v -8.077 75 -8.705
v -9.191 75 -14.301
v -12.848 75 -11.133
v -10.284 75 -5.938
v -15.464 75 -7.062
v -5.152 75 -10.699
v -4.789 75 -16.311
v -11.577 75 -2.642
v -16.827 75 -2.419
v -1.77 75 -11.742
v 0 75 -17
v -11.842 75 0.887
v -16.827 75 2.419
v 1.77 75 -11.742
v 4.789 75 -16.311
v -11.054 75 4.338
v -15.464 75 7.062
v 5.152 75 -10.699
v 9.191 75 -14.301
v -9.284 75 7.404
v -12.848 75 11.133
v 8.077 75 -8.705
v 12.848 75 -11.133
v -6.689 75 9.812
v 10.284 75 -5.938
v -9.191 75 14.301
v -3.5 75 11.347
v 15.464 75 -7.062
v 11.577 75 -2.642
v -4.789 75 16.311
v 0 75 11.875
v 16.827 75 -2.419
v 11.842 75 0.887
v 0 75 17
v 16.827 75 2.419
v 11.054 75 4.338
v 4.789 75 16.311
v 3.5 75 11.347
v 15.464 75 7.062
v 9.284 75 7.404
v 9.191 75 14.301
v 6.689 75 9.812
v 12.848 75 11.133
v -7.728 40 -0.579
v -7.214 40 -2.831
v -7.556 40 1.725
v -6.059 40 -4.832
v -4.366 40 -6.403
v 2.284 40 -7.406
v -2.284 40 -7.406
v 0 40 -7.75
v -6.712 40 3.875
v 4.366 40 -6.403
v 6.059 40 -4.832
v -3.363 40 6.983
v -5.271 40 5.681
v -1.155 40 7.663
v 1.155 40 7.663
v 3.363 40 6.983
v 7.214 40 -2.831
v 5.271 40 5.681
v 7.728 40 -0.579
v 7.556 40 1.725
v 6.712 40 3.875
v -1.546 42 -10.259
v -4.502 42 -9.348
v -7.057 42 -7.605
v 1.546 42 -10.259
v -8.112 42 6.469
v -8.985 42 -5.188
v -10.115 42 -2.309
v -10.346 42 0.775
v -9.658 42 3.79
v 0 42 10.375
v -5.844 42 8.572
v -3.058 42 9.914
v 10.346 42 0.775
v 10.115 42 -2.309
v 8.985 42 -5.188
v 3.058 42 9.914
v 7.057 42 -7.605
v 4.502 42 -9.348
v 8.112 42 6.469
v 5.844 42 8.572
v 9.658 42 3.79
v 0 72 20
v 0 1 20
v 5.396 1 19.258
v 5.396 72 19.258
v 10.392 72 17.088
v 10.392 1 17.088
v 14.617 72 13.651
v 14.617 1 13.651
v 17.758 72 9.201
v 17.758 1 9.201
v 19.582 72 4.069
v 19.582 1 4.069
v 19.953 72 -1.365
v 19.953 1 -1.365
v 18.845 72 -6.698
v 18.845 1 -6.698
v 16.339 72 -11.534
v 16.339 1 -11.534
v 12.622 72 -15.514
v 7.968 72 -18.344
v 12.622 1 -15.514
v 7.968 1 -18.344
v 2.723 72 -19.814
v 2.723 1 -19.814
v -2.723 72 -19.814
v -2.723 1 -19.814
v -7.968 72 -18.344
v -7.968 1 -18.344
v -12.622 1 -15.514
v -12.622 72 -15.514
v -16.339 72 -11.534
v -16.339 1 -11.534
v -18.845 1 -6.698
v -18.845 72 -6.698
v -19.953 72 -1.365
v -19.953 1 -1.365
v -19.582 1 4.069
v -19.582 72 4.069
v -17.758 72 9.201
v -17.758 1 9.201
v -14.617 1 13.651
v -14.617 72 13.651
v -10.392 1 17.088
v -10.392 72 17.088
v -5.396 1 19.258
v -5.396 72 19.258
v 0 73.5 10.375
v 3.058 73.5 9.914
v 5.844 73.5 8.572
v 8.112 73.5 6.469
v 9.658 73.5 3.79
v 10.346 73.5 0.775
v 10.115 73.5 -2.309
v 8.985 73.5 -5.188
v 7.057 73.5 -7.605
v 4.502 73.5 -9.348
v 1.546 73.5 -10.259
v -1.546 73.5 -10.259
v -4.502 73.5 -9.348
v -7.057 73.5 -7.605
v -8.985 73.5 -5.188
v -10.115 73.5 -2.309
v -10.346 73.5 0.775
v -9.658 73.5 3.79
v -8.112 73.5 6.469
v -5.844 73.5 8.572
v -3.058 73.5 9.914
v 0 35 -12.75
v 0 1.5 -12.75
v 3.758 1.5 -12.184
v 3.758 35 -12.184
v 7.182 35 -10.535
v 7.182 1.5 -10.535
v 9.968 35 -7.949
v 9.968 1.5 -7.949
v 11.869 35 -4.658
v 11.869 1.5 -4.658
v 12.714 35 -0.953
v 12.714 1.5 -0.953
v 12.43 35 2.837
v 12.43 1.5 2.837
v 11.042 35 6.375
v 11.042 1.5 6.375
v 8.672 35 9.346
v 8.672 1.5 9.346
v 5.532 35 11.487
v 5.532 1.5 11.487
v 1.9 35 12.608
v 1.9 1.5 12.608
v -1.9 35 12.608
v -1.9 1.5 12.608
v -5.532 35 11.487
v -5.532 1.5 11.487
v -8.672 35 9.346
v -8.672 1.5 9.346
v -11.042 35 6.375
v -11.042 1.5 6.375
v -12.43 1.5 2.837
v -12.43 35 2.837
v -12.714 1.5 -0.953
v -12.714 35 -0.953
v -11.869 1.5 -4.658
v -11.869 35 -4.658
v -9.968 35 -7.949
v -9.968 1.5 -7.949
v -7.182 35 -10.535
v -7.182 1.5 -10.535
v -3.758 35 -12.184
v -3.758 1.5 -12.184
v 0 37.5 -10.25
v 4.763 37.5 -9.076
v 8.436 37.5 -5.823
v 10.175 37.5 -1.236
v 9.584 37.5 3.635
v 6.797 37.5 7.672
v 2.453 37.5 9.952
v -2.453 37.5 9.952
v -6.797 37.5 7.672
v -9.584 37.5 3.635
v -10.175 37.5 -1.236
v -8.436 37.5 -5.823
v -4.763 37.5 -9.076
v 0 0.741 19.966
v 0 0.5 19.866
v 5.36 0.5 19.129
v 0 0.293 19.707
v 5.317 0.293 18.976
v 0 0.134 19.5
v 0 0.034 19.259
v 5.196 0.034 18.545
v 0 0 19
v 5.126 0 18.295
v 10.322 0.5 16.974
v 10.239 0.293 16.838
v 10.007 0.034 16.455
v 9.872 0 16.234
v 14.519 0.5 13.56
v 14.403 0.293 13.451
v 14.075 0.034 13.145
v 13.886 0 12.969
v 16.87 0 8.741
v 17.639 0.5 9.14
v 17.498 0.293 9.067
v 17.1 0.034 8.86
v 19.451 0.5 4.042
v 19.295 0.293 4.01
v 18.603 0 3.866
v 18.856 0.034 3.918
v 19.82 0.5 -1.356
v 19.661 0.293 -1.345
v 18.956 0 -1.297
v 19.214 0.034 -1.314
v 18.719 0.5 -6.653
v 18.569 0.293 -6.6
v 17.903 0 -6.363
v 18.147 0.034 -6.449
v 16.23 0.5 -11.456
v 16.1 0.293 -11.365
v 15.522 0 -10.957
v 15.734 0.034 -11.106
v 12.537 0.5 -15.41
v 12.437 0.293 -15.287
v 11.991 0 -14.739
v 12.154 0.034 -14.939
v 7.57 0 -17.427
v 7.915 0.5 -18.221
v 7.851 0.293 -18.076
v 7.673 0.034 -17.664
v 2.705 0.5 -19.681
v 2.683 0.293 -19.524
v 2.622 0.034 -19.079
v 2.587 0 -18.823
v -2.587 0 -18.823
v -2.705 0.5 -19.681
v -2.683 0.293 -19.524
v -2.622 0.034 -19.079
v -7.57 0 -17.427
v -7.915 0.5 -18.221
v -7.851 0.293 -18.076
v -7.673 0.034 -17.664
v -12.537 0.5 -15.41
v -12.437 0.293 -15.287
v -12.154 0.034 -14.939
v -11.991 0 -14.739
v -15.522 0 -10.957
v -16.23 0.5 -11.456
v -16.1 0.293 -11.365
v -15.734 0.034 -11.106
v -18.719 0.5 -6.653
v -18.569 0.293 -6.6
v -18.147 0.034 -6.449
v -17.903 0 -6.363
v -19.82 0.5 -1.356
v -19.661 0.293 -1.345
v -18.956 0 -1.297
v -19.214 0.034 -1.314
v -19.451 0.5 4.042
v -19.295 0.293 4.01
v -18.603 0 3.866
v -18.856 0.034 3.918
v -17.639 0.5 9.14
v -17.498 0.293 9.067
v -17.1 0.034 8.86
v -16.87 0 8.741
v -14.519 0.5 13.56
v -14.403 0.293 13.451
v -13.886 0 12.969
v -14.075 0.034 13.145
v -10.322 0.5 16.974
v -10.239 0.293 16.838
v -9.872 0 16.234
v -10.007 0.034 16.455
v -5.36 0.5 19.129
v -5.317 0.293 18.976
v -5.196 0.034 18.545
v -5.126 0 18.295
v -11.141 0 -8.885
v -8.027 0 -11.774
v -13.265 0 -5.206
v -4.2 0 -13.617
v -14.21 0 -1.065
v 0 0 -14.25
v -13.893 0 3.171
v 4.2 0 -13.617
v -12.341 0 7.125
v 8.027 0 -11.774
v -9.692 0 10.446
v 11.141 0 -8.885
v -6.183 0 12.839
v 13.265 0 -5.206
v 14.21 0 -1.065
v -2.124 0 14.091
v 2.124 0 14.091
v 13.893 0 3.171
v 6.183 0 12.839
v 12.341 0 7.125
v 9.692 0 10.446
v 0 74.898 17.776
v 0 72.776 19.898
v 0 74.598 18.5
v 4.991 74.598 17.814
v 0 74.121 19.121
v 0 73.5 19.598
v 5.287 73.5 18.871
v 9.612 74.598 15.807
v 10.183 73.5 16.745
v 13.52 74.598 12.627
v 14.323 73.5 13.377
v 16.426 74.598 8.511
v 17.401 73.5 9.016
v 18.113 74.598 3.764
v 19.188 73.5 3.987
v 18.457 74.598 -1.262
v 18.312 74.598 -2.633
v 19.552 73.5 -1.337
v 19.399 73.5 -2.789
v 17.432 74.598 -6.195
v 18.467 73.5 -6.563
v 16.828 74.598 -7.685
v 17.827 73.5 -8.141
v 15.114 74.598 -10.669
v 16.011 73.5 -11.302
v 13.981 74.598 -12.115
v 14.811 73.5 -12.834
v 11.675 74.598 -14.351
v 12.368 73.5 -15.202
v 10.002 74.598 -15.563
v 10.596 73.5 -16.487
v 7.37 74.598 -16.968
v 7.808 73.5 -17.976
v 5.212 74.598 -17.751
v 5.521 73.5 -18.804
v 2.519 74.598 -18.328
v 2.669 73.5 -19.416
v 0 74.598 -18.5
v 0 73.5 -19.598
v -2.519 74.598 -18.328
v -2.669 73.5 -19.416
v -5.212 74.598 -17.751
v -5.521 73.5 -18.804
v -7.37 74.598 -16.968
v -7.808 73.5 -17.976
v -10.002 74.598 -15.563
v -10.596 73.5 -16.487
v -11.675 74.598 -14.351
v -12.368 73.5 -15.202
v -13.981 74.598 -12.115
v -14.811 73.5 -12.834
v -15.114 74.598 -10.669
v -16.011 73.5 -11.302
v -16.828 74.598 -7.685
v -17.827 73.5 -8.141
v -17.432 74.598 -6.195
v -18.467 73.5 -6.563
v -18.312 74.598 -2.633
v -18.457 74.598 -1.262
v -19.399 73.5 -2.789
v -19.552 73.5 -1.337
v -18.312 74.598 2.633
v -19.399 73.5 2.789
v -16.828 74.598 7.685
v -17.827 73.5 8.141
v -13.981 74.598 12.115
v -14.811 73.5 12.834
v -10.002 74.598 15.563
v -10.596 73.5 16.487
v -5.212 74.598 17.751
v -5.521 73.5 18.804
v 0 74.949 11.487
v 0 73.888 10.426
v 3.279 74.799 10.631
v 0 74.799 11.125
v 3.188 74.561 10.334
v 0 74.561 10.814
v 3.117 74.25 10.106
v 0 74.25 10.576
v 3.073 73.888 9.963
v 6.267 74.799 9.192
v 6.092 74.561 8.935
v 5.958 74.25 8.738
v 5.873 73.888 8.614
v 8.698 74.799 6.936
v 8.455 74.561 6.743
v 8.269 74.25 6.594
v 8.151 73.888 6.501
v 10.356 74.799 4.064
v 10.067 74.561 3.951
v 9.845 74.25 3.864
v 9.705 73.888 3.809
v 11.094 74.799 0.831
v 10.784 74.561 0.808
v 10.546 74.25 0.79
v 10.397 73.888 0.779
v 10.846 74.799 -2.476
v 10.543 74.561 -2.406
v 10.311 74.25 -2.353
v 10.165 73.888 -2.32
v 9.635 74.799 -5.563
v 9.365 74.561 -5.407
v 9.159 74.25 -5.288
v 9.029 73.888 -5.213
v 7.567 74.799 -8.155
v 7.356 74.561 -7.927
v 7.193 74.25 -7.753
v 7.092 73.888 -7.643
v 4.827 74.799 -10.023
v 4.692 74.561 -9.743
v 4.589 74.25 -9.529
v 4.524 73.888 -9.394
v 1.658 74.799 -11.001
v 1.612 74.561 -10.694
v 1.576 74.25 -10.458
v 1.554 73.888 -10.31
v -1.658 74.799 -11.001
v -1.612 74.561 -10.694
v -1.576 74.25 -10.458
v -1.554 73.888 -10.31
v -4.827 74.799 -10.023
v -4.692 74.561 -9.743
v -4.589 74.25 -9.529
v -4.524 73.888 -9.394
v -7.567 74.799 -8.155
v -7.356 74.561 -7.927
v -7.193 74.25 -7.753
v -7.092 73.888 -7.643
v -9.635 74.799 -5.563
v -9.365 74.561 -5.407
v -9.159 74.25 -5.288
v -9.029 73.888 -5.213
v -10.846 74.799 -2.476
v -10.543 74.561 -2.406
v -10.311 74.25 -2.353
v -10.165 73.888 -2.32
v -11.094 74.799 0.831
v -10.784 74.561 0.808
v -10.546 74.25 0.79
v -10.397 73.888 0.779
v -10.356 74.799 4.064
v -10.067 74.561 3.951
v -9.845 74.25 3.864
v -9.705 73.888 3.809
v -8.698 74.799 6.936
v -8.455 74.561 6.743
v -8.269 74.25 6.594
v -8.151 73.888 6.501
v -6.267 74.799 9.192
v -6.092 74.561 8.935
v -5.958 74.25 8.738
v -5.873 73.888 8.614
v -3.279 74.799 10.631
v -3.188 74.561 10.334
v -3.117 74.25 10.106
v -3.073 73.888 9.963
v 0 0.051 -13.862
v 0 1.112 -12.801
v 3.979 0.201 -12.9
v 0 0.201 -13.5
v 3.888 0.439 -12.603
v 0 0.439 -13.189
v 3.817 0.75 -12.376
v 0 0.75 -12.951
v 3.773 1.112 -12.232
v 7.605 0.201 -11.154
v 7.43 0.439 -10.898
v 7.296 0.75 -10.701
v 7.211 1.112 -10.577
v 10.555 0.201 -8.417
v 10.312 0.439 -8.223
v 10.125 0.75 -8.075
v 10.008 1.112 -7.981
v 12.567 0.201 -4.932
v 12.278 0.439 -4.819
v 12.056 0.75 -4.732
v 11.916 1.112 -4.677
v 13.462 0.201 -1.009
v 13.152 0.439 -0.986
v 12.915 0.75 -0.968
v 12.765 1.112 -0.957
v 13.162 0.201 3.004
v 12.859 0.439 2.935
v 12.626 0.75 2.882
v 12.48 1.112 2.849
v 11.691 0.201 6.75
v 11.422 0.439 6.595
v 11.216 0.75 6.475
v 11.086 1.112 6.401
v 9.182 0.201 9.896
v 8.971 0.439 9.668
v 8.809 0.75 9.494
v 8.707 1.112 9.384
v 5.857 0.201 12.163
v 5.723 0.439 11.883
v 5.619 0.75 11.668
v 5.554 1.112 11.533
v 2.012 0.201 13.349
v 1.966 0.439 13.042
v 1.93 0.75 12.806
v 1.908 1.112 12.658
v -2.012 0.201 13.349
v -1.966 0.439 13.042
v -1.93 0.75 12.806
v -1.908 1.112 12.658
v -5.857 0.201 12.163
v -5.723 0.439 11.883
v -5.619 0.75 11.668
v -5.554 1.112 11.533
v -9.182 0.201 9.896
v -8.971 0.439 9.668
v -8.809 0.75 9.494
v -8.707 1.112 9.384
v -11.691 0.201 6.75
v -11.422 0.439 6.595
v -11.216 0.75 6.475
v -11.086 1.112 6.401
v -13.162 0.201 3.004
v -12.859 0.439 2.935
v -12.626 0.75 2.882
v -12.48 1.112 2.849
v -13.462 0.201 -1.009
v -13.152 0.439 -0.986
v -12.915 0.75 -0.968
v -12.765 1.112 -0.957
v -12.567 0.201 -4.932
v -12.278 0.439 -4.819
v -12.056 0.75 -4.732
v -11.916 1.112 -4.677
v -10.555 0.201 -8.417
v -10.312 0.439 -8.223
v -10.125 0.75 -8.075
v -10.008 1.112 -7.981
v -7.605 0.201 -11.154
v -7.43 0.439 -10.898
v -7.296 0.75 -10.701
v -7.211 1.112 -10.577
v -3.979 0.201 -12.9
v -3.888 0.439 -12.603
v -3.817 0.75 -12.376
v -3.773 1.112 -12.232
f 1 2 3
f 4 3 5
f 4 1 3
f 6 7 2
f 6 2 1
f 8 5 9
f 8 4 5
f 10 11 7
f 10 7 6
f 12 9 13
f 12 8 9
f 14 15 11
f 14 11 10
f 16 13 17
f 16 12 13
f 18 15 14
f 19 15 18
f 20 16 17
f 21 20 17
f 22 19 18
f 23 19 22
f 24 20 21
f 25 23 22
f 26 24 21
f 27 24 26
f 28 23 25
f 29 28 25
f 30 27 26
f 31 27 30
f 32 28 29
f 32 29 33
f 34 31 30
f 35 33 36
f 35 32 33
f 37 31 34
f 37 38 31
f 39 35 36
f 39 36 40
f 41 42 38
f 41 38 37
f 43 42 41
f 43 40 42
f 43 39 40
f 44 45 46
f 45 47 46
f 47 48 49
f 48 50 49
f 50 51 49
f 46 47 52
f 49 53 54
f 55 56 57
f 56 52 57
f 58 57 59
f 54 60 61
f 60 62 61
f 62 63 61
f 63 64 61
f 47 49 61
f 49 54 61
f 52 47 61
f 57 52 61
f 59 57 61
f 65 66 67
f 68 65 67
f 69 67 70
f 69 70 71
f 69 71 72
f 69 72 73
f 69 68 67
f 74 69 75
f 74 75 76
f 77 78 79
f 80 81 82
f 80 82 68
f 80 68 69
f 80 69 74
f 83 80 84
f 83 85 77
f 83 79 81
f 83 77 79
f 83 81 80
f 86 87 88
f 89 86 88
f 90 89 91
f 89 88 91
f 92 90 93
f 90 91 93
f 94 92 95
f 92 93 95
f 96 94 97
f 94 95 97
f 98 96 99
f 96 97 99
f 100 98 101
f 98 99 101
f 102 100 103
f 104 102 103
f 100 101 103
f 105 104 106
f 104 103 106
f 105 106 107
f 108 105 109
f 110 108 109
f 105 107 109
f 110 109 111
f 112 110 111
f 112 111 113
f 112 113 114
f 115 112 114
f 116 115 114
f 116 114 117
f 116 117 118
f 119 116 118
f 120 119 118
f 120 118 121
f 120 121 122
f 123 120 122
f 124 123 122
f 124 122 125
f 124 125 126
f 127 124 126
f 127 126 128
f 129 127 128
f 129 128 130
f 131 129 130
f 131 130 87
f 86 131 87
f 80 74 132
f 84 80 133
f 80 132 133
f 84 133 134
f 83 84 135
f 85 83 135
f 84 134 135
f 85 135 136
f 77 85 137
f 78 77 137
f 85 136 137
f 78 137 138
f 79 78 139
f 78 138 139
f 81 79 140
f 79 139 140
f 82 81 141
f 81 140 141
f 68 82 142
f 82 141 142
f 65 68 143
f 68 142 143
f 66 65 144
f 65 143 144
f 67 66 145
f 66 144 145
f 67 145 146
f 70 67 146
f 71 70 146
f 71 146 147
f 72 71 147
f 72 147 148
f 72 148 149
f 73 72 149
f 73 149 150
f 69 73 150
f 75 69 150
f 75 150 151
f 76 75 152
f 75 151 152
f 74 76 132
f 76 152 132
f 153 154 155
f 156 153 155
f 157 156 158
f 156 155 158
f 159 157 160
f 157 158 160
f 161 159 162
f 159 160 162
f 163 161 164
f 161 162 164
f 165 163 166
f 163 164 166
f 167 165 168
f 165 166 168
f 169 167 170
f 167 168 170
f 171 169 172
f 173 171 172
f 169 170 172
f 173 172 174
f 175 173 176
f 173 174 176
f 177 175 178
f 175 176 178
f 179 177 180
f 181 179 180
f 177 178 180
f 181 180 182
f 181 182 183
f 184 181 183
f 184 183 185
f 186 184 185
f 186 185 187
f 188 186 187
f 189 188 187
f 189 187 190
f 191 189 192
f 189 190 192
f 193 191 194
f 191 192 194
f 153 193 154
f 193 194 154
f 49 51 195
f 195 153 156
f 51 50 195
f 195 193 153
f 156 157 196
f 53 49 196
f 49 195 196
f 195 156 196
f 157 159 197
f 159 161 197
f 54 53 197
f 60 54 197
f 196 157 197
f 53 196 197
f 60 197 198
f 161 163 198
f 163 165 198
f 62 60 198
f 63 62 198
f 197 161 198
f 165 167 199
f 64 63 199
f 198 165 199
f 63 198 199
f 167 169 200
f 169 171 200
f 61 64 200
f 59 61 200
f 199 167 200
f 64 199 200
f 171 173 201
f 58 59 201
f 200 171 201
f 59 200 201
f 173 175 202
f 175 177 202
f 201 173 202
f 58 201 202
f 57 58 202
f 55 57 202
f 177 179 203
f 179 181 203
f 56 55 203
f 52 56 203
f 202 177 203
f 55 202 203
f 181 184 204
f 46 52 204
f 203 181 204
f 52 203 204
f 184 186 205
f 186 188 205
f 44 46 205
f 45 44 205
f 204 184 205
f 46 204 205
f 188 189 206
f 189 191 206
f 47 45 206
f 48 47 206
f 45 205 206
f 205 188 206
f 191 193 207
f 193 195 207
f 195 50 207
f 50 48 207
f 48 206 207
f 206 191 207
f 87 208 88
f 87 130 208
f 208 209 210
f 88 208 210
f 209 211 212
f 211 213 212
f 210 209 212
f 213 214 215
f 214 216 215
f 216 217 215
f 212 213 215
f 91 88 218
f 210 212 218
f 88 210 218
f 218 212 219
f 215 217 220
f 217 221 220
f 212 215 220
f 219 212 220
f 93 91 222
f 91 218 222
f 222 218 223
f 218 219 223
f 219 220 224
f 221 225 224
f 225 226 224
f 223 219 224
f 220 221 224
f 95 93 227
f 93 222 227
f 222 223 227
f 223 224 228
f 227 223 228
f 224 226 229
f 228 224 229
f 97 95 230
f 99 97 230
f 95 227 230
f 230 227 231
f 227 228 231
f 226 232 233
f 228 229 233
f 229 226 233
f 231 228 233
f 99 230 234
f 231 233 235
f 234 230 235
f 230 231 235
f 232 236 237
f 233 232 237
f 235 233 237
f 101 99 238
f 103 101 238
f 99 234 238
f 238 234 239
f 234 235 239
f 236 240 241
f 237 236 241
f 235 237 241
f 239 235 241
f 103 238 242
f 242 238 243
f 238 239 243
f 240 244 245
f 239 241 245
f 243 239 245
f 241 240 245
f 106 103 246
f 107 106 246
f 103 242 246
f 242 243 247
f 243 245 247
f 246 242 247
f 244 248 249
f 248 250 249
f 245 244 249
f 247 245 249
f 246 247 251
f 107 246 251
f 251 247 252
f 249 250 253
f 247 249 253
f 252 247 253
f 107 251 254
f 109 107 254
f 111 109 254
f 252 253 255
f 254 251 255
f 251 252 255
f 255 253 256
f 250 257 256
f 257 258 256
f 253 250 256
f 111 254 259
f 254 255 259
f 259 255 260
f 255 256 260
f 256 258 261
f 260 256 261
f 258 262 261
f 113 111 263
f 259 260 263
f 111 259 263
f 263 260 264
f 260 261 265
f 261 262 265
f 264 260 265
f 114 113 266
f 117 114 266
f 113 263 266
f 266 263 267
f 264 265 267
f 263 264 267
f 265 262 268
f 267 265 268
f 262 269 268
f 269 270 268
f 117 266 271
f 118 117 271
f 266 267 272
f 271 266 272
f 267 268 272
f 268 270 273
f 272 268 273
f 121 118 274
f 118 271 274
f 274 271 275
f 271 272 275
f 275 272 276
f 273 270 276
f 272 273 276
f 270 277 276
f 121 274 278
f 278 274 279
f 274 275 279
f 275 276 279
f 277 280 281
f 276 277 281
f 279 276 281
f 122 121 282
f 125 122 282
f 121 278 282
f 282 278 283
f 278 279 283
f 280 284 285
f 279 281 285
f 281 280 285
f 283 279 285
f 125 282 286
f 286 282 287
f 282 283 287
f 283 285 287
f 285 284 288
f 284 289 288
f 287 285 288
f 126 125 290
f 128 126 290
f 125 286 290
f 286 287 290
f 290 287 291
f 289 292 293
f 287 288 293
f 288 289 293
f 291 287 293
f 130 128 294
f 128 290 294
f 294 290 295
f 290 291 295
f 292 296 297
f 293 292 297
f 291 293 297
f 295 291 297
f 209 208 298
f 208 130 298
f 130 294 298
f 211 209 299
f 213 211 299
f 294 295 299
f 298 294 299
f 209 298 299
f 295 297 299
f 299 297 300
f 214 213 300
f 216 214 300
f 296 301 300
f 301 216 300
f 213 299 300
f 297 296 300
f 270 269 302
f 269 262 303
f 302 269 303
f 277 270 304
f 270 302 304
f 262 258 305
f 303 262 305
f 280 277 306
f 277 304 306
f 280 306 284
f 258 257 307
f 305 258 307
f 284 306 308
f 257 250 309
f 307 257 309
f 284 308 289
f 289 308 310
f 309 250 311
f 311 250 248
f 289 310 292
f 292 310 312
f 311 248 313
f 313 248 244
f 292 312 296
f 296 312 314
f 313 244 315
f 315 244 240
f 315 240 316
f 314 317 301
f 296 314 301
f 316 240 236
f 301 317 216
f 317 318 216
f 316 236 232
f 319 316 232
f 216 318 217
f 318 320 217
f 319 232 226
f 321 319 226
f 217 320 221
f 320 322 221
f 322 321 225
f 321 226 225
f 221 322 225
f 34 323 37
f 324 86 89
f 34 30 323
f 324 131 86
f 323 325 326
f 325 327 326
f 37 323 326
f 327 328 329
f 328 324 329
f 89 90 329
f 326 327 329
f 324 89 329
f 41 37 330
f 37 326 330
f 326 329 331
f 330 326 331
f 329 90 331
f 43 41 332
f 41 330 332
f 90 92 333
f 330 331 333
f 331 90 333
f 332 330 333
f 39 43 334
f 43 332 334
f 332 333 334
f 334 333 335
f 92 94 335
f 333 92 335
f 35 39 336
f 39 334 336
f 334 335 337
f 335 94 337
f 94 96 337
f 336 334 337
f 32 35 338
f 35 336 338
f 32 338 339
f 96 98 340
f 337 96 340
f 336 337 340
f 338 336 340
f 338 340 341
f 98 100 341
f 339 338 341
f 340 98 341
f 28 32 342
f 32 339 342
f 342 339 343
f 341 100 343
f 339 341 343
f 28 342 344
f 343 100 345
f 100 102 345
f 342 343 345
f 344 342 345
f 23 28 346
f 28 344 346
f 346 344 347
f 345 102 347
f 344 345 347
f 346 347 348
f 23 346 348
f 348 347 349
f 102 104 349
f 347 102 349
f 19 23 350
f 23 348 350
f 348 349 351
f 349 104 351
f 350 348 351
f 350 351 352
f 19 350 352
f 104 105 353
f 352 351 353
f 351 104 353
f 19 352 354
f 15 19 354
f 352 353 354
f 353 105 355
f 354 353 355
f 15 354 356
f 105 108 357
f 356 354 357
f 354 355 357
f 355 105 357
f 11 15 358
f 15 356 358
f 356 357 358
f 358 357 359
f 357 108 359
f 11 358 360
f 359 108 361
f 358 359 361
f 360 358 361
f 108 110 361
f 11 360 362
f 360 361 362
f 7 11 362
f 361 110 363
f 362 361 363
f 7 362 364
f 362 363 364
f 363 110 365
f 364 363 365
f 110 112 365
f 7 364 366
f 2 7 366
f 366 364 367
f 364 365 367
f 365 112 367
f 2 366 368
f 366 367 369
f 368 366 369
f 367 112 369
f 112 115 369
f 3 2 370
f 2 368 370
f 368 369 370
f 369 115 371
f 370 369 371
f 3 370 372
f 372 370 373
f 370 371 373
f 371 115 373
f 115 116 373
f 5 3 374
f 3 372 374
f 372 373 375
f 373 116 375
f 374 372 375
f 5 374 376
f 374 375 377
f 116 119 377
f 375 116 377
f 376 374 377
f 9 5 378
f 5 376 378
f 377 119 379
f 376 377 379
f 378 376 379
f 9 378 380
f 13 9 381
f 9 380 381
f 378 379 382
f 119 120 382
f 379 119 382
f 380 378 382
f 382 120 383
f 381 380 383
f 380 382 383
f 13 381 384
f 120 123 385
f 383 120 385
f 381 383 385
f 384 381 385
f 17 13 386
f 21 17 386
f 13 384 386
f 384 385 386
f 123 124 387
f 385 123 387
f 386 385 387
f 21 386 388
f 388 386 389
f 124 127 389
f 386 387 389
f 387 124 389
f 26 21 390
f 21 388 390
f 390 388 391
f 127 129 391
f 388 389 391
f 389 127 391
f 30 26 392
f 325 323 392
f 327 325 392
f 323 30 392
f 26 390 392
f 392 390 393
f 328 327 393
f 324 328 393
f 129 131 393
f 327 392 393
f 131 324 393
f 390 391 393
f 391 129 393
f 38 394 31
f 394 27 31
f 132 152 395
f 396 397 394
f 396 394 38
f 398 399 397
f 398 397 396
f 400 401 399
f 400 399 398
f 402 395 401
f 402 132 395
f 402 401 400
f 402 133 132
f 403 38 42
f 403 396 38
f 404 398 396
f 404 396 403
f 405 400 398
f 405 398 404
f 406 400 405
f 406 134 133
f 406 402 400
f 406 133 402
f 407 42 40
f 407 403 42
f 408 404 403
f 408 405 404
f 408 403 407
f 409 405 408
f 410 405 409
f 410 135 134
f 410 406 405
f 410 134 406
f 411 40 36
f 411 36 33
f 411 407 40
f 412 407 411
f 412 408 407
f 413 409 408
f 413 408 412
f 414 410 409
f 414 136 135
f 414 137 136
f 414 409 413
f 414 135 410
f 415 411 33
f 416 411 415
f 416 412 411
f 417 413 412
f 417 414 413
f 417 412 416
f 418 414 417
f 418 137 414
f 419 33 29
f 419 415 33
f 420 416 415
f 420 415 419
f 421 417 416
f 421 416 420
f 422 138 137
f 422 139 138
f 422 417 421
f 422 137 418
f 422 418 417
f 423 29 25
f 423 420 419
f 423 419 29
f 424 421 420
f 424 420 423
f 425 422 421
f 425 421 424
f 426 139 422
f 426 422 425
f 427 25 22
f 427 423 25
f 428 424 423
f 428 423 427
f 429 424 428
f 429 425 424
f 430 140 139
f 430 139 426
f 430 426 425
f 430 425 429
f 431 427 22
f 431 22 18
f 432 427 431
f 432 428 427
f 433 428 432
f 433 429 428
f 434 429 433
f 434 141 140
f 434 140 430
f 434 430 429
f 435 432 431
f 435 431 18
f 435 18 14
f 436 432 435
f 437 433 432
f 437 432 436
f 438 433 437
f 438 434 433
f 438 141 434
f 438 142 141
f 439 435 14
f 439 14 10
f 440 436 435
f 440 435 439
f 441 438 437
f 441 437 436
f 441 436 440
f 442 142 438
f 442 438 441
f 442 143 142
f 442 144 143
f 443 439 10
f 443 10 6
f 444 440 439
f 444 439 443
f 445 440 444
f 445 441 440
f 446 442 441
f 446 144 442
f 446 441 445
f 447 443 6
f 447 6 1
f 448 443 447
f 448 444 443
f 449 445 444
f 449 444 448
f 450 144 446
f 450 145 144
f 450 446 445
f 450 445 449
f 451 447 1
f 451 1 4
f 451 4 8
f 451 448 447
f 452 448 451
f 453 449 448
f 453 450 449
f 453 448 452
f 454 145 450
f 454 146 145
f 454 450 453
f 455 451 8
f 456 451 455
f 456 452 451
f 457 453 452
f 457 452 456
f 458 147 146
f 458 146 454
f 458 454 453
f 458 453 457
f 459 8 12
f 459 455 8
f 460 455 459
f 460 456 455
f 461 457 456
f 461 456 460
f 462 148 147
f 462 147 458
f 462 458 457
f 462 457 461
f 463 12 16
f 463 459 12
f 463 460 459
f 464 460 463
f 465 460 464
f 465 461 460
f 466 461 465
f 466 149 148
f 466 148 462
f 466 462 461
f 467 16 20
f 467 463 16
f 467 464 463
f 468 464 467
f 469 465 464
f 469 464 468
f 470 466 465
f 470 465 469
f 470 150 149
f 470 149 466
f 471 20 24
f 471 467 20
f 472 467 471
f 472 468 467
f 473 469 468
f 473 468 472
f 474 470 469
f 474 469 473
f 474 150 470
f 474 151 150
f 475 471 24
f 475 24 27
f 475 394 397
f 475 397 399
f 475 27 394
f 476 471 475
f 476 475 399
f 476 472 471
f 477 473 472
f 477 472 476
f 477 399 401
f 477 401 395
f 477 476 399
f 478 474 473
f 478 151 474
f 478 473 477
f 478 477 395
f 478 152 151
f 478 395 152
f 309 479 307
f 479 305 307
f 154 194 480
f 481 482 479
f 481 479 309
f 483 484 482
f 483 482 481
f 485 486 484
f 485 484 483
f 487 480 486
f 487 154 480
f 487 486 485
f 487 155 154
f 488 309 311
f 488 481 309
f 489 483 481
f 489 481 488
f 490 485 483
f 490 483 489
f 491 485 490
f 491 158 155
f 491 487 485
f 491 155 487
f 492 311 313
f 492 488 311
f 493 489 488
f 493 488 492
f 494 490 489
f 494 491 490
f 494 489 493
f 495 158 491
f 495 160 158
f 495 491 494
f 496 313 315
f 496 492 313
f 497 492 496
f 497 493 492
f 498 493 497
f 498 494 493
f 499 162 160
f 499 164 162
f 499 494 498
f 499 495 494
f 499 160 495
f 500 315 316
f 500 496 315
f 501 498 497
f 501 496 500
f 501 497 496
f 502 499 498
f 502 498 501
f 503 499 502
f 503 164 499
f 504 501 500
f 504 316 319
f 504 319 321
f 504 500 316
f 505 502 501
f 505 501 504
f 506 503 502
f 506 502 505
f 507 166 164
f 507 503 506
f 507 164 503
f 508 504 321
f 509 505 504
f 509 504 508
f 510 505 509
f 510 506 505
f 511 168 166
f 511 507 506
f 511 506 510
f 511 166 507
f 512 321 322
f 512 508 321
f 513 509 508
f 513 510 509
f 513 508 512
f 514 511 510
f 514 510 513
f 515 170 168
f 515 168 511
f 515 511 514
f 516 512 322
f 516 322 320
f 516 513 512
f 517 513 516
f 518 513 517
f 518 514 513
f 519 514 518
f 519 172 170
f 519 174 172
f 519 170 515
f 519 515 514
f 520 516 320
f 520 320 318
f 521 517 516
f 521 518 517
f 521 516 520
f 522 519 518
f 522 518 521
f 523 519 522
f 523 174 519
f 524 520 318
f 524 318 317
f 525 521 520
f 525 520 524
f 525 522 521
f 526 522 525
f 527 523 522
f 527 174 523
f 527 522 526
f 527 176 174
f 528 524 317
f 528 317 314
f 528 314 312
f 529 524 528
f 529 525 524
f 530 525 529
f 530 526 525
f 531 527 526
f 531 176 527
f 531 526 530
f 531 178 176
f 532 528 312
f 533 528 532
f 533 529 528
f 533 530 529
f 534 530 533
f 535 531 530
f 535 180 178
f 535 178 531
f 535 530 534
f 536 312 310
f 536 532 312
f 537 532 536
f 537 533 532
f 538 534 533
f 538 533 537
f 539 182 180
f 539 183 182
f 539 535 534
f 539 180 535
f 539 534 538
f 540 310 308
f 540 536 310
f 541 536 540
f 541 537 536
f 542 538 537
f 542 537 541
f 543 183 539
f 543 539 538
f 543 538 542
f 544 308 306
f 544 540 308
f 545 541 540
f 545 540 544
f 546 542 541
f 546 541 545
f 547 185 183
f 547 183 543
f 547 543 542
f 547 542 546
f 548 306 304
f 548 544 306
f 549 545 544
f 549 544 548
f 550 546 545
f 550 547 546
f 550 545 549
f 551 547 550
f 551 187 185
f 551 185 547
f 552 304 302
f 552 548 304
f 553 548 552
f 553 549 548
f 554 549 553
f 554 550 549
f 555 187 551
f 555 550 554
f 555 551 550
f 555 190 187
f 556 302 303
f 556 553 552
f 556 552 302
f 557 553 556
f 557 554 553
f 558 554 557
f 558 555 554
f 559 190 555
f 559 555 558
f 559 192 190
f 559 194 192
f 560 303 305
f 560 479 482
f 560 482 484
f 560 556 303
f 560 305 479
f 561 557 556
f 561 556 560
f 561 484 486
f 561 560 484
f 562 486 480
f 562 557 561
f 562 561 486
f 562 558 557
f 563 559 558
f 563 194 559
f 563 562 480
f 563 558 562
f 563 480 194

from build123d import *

# Parameters (mm, degrees)
SKETCH1_R           = 20
BOSS_EXTRUDE1_DEPTH = 35
SKETCH2_R           = 12.75
CUT_EXTRUDE1_DEPTH  = 35
SKETCH3_R           = 20
BOSS_EXTRUDE2_DEPTH = 5
SKETCH4_R           = 12.75
CUT_EXTRUDE2_DEPTH  = 10
CUT_EXTRUDE2_DRAFT  = -45
SKETCH5_R           = 20
BOSS_EXTRUDE3_DEPTH = 35
SKETCH6_R           = 10.375
CUT_EXTRUDE3_DEPTH  = 33
FILLET1_R           = 1.5
FILLET2_R           = 1.5
FILLET3_R           = 3
FILLET4_R           = 1


with BuildPart() as part:
    # Sketch1 → Boss-Extrude1 (new body)
    with BuildSketch(Plane(origin=(0, 0, 0), x_dir=(1, 0, 0), z_dir=(0, 1, 0))):
        with Locations(Location((0, 0, 0), (0, 0, 270))):
            Circle(SKETCH1_R)
    extrude(amount=BOSS_EXTRUDE1_DEPTH)

    # Sketch2 → Cut-Extrude1 (cut)
    with BuildSketch(Plane.XZ):
        with Locations(Location((0, 0, 0), (0, 0, 270))):
            Circle(SKETCH2_R)
    extrude(amount=-CUT_EXTRUDE1_DEPTH, mode=Mode.SUBTRACT)

    # Sketch3 → Boss-Extrude2 (add)
    with BuildSketch(Plane(origin=(0, 35, 0), x_dir=(1, 0, 0), z_dir=(0, 1, 0))):
        with Locations(Location((0, 0, 0), (0, 0, 270))):
            Circle(SKETCH3_R)
    extrude(amount=BOSS_EXTRUDE2_DEPTH)


with BuildPart() as cut_extrude2_tool:
    # Sketch4 → Cut-Extrude2 (with draft: the straight prism first)
    with BuildSketch(Plane.XZ.offset(-35)):
        with Locations(Location((0, 0, 0), (0, 0, 270))):
            Circle(SKETCH4_R)
    extrude(amount=-CUT_EXTRUDE2_DEPTH)
    # Cut-Extrude2: the draft: its side faces are tilted about the plane it starts from
    cut_extrude2_sides = [cut_extrude2_tool.faces().sort_by_distance(p)[0] for p in [
        (0, 40, 12.75),
    ]]
    draft(cut_extrude2_sides, Plane.XZ.offset(-35), CUT_EXTRUDE2_DRAFT)


with BuildPart() as part_1:
    add(part.part)

    # Cut-Extrude2: cut by cut_extrude2_tool
    add(cut_extrude2_tool.part, mode=Mode.SUBTRACT)

    # Sketch5 → Boss-Extrude3 (add)
    with BuildSketch(Plane(origin=(0, 40, 0), x_dir=(1, 0, 0), z_dir=(0, 1, 0))):
        with Locations(Location((0, 0, 0), (0, 0, 270))):
            Circle(SKETCH5_R)
    extrude(amount=BOSS_EXTRUDE3_DEPTH)

    # Sketch6 → Cut-Extrude3 (cut)
    with BuildSketch(Plane(origin=(0, 75, 0), x_dir=(1, 0, 0), z_dir=(0, 1, 0))):
        with Locations(Location((0, 0, 0), (0, 0, 270))):
            Circle(SKETCH6_R)
    extrude(amount=-CUT_EXTRUDE3_DEPTH, mode=Mode.SUBTRACT)

    # Fillet1
    fillet1_edges = [part_1.edges().sort_by_distance(p)[0] for p in [
        (0, 0, 12.75),
    ]]
    fillet(fillet1_edges, radius=FILLET1_R)

    # Fillet2
    fillet2_edges = [part_1.edges().sort_by_distance(p)[0] for p in [
        (0, 75, -10.375),
    ]]
    fillet(fillet2_edges, radius=FILLET2_R)

    # Fillet3
    fillet3_edges = [part_1.edges().sort_by_distance(p)[0] for p in [
        (0, 75, -20),
    ]]
    fillet(fillet3_edges, radius=FILLET3_R)

    # Fillet4
    fillet4_edges = [part_1.edges().sort_by_distance(p)[0] for p in [
        (0, 0, -20),
    ]]
    fillet(fillet4_edges, radius=FILLET4_R)


solid = part_1.part
